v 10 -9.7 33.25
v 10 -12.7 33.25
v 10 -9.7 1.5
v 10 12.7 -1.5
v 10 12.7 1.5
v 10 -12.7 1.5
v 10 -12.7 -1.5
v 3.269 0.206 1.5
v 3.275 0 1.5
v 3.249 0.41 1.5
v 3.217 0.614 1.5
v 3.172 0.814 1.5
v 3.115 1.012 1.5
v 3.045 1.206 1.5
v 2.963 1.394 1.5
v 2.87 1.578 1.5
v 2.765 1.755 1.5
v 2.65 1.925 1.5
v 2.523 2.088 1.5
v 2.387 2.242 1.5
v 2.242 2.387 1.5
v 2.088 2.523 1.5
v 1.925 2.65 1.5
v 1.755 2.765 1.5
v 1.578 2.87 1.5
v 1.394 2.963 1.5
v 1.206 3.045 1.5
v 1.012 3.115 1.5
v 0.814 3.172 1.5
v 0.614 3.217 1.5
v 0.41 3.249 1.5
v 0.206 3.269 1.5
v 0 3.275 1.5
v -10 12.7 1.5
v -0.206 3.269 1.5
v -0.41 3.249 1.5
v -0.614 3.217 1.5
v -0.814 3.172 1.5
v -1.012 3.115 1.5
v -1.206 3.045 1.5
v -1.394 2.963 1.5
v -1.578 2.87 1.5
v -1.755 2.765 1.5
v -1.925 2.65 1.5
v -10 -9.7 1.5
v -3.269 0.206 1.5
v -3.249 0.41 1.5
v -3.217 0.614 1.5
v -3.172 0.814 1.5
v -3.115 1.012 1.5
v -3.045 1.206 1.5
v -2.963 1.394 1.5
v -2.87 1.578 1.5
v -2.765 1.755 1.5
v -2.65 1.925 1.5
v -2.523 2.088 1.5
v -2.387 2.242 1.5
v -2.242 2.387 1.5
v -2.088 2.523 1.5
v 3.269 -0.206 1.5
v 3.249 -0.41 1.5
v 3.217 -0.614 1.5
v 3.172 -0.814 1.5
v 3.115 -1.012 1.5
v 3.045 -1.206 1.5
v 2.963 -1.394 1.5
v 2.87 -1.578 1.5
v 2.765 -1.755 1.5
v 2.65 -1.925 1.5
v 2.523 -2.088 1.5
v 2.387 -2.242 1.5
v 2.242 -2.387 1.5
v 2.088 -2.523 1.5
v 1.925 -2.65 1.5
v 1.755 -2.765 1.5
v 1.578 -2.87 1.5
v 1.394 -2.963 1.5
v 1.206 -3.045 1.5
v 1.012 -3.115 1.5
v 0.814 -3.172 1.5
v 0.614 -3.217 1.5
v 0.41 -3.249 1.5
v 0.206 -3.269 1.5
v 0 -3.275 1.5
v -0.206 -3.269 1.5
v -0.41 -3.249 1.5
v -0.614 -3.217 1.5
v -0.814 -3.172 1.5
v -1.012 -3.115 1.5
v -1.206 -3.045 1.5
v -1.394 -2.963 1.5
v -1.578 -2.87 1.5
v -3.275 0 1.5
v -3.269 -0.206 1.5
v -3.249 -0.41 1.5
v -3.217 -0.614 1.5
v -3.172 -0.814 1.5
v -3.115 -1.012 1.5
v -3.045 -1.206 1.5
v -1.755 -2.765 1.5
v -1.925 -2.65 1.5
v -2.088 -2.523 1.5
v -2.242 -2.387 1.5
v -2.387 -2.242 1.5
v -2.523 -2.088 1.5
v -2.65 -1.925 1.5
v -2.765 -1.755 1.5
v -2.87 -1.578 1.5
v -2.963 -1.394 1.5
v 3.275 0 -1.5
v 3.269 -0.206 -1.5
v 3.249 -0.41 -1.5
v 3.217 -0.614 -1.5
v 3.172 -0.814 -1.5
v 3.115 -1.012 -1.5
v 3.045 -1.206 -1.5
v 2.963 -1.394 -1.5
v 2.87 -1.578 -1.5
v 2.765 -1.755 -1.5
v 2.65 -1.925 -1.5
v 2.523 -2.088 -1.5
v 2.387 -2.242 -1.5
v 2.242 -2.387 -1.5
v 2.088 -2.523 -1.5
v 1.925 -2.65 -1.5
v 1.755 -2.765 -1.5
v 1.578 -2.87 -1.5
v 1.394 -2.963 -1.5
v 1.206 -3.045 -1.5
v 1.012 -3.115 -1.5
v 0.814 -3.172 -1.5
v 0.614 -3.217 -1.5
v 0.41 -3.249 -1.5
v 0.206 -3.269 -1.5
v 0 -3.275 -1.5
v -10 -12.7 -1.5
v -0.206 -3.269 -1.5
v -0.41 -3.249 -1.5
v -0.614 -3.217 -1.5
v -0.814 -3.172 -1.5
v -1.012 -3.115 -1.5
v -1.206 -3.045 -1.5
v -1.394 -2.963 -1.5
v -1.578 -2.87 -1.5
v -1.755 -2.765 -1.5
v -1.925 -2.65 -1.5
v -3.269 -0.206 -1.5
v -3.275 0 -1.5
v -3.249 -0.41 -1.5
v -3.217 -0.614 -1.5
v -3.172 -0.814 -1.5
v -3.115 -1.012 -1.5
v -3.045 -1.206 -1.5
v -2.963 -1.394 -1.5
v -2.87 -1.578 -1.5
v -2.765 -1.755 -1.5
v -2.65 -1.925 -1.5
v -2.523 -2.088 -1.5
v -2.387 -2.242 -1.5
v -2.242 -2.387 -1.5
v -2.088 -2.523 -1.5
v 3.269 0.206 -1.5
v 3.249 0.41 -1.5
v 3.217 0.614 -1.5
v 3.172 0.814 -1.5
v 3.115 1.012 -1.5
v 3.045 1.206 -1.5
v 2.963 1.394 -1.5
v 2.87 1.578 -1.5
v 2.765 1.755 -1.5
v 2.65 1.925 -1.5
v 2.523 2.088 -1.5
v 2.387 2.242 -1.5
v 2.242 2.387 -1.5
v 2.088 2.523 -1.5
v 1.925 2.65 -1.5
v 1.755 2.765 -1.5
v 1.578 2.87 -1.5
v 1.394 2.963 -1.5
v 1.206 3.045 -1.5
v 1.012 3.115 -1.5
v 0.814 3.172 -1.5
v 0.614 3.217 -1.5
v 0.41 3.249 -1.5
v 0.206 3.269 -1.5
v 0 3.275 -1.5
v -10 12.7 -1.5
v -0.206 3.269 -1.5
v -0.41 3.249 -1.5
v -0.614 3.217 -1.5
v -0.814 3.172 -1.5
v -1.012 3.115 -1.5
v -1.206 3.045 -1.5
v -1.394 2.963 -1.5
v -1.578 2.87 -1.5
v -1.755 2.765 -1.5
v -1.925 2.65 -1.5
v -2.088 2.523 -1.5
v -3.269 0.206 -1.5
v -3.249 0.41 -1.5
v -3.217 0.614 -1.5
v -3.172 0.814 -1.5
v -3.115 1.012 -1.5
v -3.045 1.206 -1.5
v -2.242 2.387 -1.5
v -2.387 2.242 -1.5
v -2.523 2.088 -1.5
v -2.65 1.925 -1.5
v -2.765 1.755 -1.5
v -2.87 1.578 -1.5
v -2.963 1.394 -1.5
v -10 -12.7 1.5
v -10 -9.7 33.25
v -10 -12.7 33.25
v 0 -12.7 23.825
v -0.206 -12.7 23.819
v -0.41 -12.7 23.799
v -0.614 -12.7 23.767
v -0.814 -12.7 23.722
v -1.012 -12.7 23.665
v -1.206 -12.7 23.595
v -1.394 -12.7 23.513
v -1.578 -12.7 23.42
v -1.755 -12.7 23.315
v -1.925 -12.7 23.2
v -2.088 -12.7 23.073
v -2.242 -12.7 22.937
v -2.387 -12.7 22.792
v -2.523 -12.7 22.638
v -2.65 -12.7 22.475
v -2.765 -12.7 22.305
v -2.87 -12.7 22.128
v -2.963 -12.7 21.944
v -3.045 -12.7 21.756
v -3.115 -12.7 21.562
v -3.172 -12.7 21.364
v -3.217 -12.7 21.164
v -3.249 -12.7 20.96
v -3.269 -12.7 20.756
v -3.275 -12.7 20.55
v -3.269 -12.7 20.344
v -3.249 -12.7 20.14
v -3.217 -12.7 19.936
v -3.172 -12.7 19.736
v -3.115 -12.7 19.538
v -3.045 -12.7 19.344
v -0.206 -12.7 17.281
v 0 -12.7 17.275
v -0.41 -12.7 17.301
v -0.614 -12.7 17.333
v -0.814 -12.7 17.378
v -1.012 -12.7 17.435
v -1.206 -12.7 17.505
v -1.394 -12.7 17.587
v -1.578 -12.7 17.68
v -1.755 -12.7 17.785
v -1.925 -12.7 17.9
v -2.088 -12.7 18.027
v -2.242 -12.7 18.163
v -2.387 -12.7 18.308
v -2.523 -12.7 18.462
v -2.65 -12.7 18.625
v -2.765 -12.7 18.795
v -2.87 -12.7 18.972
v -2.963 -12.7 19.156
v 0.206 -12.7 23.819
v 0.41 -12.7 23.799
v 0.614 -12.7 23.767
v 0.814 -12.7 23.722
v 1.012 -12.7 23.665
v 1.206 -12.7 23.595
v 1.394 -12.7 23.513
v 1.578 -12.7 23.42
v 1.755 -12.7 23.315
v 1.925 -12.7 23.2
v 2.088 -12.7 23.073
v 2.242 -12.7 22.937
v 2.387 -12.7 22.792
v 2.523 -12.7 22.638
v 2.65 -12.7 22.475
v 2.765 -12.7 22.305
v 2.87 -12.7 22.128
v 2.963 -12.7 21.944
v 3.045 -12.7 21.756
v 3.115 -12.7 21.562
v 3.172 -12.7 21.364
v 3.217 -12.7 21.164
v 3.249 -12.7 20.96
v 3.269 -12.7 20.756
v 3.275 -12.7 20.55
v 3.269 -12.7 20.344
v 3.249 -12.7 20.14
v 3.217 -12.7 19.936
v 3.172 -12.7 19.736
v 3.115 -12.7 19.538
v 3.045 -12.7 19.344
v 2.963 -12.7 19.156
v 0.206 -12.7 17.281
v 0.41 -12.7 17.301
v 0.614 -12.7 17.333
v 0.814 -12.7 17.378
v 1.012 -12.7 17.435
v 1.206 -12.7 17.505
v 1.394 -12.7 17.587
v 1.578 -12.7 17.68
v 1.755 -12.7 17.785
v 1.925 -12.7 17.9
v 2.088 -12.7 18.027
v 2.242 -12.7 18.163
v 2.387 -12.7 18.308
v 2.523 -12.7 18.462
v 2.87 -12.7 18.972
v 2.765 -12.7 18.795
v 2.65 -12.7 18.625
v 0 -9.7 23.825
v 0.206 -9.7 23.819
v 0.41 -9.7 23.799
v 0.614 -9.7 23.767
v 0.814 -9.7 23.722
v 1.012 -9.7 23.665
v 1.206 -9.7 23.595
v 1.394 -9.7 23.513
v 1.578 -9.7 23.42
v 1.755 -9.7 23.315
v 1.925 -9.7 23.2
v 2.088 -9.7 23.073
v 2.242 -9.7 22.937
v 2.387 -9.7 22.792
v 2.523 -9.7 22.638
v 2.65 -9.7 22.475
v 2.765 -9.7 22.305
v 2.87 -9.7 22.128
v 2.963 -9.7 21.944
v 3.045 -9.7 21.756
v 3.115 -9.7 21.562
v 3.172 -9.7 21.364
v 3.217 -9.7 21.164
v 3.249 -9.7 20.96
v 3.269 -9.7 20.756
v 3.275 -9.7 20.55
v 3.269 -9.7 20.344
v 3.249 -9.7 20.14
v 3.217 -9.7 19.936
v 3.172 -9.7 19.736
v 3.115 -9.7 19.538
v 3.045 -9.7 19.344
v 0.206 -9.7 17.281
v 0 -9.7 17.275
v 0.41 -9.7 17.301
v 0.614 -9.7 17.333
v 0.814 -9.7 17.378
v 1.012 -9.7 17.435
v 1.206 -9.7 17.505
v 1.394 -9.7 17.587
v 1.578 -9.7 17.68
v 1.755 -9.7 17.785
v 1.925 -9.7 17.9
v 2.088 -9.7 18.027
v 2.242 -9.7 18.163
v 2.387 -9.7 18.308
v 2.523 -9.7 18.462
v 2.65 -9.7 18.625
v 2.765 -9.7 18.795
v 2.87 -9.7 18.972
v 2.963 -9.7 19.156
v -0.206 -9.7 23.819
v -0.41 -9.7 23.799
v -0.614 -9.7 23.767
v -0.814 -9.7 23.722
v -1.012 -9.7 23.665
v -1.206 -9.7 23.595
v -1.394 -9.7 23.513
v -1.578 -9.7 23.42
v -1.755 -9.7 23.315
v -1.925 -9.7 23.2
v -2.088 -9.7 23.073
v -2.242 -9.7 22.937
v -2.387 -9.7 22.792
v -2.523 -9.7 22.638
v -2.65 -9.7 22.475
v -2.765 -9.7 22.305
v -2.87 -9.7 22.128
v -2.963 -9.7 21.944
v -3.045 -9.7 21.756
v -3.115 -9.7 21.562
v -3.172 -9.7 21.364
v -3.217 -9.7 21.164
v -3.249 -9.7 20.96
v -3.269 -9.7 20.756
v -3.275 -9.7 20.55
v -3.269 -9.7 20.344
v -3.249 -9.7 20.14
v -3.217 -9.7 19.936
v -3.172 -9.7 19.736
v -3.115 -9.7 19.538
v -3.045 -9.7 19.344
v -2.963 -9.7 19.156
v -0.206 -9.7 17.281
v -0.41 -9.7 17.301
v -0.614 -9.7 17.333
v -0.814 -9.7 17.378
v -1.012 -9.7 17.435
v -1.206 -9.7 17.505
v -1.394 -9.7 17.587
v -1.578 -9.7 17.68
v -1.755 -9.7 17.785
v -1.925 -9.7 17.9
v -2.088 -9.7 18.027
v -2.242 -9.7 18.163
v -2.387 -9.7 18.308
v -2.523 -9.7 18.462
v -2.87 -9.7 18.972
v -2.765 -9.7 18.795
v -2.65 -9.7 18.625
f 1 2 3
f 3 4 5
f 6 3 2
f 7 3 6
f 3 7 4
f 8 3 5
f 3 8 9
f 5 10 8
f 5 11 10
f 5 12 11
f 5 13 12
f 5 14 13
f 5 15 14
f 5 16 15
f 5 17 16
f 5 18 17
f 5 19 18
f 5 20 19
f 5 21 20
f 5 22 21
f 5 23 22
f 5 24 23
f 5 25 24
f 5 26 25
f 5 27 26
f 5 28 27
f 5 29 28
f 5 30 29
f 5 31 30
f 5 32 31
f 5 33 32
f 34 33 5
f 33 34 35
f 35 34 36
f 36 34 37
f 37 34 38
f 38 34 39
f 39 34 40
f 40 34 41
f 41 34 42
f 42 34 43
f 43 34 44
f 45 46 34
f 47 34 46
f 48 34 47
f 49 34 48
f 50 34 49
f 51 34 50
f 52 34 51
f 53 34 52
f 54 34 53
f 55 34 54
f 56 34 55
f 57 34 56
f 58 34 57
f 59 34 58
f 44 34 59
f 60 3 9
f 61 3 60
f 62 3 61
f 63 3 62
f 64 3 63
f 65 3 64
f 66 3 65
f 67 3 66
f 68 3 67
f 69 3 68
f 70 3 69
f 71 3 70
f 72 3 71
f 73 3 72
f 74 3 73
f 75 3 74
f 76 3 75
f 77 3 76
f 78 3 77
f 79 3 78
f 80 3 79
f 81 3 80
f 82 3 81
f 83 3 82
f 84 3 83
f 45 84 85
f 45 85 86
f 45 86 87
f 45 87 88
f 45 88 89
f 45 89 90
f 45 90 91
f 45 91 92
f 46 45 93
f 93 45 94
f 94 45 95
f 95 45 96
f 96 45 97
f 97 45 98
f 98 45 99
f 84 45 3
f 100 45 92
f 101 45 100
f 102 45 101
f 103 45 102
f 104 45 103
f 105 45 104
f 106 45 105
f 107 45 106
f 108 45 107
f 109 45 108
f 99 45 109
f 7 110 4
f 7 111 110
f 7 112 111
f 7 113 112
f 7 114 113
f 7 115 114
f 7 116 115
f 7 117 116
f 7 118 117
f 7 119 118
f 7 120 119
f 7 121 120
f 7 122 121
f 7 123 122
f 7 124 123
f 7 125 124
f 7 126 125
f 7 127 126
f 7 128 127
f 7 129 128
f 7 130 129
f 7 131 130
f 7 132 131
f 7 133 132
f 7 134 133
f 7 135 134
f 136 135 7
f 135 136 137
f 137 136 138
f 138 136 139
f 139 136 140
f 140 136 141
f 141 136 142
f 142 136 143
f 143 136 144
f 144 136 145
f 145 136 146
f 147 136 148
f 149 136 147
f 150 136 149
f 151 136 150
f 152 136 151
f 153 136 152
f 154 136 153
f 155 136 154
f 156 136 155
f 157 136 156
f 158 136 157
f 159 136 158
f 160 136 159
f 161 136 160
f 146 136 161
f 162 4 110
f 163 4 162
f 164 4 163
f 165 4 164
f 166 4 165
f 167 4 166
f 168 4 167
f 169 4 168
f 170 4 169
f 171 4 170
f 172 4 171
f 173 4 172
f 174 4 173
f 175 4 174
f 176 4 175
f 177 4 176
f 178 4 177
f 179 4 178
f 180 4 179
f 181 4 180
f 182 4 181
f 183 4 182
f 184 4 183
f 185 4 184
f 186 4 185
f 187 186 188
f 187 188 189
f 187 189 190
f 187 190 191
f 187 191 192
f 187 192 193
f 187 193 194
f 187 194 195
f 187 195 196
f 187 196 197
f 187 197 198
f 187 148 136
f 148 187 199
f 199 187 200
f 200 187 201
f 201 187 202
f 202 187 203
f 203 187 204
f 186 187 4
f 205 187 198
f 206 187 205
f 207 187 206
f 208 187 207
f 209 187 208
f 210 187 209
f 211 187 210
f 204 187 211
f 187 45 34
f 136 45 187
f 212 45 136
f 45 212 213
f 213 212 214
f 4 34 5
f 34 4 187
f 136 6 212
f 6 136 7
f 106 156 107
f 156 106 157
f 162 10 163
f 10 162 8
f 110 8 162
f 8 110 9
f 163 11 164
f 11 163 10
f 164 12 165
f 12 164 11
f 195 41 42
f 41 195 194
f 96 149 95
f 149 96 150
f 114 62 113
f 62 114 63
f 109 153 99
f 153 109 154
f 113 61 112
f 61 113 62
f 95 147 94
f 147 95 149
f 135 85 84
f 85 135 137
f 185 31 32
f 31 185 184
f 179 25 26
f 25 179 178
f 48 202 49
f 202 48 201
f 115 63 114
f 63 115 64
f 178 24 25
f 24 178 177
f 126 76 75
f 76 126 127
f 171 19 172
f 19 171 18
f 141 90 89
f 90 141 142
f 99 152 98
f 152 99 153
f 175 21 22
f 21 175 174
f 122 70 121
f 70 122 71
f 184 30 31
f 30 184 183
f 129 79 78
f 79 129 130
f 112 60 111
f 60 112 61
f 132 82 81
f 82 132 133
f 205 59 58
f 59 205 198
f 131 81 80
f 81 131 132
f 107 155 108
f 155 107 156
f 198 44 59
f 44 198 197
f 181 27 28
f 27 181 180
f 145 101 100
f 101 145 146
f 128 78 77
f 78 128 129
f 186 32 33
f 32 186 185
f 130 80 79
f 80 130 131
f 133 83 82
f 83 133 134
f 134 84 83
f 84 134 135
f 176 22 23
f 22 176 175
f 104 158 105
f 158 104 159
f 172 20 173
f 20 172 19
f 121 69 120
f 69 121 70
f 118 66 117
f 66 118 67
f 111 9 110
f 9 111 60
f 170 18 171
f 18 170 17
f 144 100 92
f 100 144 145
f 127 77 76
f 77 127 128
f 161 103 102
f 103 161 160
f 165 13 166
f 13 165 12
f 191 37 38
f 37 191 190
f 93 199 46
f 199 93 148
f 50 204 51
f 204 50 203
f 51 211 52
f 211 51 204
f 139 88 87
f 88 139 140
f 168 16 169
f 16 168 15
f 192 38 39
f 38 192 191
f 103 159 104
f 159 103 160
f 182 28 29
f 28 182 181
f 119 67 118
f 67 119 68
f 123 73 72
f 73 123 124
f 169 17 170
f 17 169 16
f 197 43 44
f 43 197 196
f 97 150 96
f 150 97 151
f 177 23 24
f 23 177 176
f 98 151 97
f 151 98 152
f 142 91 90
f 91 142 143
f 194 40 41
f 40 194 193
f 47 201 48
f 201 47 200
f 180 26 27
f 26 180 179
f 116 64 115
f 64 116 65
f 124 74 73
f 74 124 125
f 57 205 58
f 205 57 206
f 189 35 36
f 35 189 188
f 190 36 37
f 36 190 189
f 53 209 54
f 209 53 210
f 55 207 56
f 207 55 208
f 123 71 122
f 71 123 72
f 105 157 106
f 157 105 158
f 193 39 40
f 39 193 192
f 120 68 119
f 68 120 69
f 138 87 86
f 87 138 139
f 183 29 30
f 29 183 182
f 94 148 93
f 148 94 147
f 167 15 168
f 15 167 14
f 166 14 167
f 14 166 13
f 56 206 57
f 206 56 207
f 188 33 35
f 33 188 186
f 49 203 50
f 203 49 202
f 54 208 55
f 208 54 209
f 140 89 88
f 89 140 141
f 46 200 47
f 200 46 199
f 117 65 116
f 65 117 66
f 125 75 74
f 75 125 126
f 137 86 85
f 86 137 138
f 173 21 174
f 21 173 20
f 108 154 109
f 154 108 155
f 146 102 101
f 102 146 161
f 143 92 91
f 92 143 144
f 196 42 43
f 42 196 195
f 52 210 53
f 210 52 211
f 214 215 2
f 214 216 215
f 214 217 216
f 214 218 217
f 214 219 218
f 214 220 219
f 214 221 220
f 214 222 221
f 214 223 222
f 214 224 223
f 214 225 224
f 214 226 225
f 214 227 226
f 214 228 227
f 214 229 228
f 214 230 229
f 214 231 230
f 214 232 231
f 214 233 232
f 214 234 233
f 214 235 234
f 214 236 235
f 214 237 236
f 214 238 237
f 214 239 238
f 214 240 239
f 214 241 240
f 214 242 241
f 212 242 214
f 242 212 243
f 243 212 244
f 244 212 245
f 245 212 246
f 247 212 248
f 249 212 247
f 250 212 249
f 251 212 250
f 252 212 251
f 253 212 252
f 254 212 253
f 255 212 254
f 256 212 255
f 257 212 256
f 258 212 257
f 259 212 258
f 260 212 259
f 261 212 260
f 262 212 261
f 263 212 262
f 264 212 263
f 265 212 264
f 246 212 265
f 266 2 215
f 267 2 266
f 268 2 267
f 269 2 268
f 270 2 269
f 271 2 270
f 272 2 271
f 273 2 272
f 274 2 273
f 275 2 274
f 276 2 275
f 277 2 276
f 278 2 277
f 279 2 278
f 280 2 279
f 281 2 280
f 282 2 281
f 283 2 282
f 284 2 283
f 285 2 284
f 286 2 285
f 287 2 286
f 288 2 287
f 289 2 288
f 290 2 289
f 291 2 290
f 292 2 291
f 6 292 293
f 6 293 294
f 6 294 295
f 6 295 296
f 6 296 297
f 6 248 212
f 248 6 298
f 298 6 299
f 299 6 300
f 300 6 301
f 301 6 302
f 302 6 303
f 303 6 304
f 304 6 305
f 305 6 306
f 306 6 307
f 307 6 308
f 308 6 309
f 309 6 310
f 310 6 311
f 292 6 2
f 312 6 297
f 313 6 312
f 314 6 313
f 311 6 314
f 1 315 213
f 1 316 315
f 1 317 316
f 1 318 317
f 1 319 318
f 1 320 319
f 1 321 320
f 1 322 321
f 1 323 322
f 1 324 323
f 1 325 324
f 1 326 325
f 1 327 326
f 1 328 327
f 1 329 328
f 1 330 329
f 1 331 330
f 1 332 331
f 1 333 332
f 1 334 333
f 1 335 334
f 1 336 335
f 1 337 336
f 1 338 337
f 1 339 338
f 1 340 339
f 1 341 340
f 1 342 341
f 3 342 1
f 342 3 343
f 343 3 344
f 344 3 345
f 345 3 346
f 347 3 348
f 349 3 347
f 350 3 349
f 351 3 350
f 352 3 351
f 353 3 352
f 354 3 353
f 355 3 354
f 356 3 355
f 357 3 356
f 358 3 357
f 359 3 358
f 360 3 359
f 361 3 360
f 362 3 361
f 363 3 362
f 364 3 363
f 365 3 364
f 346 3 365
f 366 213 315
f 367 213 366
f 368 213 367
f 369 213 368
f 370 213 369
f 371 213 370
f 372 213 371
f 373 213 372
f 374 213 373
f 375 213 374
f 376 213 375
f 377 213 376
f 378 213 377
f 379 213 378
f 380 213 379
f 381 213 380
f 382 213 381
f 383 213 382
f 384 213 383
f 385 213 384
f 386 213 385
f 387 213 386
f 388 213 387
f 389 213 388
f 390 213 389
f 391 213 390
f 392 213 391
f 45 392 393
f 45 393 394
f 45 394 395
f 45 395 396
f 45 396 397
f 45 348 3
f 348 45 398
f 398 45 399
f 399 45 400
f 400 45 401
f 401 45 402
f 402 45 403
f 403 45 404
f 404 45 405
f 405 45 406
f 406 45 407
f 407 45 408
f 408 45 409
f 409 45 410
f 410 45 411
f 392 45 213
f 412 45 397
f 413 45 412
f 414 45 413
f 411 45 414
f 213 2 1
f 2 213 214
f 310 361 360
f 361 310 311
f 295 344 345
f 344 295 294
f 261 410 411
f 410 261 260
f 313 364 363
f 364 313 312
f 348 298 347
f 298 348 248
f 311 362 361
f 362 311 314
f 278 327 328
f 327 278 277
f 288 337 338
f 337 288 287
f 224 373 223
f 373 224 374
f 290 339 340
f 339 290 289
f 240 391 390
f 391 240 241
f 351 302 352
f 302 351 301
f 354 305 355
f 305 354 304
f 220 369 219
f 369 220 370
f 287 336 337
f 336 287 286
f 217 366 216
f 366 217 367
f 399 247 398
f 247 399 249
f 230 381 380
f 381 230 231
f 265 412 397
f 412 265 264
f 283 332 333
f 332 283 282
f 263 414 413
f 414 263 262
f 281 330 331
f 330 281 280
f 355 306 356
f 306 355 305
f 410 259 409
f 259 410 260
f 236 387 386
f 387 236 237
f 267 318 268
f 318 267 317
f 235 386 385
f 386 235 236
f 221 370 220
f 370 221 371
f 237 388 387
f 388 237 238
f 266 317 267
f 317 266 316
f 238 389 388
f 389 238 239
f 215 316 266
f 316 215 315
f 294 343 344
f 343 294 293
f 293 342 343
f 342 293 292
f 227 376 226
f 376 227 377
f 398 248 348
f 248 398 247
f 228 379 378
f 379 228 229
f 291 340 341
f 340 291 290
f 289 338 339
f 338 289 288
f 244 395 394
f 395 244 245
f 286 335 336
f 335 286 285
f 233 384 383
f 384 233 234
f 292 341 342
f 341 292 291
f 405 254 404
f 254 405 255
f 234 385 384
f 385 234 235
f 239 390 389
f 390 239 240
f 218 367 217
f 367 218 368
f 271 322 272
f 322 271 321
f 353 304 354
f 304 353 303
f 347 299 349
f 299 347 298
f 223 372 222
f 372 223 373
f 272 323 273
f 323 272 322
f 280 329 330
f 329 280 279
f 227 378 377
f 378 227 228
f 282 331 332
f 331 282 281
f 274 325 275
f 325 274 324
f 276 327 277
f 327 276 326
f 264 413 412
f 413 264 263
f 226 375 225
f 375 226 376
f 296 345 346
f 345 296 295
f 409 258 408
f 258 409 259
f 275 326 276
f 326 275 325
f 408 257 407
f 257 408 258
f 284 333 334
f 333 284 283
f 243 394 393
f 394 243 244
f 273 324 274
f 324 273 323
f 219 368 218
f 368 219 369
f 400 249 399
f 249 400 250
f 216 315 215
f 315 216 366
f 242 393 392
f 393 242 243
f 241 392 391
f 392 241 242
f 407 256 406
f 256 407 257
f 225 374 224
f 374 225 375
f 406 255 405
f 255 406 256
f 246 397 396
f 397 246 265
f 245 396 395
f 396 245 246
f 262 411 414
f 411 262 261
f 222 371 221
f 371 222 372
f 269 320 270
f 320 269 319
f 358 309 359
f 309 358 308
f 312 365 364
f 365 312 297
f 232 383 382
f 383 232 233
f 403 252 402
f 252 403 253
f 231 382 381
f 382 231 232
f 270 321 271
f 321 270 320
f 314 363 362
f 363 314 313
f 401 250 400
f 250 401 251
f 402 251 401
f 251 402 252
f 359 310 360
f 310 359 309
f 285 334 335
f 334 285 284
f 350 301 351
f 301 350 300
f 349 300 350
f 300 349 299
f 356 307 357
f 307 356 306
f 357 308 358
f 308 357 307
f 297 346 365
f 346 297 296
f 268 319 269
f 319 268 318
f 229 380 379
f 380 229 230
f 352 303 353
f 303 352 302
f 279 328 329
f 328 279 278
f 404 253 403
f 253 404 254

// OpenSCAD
$fn=100;

in=25.4;
x=20;

z=3;
bolt=1/4*in+.2;

mod=1.25*in;

module latch(y=in){
    difference(){
        cube([x,y,z],center=true);
        
        translate([0,y/2-in/2,-z])
        cylinder(100,d=bolt);
    }
}

latch();

rotate([90,0,0])
translate([0,mod/2+z/2,in/2-z/2])
latch(mod);
